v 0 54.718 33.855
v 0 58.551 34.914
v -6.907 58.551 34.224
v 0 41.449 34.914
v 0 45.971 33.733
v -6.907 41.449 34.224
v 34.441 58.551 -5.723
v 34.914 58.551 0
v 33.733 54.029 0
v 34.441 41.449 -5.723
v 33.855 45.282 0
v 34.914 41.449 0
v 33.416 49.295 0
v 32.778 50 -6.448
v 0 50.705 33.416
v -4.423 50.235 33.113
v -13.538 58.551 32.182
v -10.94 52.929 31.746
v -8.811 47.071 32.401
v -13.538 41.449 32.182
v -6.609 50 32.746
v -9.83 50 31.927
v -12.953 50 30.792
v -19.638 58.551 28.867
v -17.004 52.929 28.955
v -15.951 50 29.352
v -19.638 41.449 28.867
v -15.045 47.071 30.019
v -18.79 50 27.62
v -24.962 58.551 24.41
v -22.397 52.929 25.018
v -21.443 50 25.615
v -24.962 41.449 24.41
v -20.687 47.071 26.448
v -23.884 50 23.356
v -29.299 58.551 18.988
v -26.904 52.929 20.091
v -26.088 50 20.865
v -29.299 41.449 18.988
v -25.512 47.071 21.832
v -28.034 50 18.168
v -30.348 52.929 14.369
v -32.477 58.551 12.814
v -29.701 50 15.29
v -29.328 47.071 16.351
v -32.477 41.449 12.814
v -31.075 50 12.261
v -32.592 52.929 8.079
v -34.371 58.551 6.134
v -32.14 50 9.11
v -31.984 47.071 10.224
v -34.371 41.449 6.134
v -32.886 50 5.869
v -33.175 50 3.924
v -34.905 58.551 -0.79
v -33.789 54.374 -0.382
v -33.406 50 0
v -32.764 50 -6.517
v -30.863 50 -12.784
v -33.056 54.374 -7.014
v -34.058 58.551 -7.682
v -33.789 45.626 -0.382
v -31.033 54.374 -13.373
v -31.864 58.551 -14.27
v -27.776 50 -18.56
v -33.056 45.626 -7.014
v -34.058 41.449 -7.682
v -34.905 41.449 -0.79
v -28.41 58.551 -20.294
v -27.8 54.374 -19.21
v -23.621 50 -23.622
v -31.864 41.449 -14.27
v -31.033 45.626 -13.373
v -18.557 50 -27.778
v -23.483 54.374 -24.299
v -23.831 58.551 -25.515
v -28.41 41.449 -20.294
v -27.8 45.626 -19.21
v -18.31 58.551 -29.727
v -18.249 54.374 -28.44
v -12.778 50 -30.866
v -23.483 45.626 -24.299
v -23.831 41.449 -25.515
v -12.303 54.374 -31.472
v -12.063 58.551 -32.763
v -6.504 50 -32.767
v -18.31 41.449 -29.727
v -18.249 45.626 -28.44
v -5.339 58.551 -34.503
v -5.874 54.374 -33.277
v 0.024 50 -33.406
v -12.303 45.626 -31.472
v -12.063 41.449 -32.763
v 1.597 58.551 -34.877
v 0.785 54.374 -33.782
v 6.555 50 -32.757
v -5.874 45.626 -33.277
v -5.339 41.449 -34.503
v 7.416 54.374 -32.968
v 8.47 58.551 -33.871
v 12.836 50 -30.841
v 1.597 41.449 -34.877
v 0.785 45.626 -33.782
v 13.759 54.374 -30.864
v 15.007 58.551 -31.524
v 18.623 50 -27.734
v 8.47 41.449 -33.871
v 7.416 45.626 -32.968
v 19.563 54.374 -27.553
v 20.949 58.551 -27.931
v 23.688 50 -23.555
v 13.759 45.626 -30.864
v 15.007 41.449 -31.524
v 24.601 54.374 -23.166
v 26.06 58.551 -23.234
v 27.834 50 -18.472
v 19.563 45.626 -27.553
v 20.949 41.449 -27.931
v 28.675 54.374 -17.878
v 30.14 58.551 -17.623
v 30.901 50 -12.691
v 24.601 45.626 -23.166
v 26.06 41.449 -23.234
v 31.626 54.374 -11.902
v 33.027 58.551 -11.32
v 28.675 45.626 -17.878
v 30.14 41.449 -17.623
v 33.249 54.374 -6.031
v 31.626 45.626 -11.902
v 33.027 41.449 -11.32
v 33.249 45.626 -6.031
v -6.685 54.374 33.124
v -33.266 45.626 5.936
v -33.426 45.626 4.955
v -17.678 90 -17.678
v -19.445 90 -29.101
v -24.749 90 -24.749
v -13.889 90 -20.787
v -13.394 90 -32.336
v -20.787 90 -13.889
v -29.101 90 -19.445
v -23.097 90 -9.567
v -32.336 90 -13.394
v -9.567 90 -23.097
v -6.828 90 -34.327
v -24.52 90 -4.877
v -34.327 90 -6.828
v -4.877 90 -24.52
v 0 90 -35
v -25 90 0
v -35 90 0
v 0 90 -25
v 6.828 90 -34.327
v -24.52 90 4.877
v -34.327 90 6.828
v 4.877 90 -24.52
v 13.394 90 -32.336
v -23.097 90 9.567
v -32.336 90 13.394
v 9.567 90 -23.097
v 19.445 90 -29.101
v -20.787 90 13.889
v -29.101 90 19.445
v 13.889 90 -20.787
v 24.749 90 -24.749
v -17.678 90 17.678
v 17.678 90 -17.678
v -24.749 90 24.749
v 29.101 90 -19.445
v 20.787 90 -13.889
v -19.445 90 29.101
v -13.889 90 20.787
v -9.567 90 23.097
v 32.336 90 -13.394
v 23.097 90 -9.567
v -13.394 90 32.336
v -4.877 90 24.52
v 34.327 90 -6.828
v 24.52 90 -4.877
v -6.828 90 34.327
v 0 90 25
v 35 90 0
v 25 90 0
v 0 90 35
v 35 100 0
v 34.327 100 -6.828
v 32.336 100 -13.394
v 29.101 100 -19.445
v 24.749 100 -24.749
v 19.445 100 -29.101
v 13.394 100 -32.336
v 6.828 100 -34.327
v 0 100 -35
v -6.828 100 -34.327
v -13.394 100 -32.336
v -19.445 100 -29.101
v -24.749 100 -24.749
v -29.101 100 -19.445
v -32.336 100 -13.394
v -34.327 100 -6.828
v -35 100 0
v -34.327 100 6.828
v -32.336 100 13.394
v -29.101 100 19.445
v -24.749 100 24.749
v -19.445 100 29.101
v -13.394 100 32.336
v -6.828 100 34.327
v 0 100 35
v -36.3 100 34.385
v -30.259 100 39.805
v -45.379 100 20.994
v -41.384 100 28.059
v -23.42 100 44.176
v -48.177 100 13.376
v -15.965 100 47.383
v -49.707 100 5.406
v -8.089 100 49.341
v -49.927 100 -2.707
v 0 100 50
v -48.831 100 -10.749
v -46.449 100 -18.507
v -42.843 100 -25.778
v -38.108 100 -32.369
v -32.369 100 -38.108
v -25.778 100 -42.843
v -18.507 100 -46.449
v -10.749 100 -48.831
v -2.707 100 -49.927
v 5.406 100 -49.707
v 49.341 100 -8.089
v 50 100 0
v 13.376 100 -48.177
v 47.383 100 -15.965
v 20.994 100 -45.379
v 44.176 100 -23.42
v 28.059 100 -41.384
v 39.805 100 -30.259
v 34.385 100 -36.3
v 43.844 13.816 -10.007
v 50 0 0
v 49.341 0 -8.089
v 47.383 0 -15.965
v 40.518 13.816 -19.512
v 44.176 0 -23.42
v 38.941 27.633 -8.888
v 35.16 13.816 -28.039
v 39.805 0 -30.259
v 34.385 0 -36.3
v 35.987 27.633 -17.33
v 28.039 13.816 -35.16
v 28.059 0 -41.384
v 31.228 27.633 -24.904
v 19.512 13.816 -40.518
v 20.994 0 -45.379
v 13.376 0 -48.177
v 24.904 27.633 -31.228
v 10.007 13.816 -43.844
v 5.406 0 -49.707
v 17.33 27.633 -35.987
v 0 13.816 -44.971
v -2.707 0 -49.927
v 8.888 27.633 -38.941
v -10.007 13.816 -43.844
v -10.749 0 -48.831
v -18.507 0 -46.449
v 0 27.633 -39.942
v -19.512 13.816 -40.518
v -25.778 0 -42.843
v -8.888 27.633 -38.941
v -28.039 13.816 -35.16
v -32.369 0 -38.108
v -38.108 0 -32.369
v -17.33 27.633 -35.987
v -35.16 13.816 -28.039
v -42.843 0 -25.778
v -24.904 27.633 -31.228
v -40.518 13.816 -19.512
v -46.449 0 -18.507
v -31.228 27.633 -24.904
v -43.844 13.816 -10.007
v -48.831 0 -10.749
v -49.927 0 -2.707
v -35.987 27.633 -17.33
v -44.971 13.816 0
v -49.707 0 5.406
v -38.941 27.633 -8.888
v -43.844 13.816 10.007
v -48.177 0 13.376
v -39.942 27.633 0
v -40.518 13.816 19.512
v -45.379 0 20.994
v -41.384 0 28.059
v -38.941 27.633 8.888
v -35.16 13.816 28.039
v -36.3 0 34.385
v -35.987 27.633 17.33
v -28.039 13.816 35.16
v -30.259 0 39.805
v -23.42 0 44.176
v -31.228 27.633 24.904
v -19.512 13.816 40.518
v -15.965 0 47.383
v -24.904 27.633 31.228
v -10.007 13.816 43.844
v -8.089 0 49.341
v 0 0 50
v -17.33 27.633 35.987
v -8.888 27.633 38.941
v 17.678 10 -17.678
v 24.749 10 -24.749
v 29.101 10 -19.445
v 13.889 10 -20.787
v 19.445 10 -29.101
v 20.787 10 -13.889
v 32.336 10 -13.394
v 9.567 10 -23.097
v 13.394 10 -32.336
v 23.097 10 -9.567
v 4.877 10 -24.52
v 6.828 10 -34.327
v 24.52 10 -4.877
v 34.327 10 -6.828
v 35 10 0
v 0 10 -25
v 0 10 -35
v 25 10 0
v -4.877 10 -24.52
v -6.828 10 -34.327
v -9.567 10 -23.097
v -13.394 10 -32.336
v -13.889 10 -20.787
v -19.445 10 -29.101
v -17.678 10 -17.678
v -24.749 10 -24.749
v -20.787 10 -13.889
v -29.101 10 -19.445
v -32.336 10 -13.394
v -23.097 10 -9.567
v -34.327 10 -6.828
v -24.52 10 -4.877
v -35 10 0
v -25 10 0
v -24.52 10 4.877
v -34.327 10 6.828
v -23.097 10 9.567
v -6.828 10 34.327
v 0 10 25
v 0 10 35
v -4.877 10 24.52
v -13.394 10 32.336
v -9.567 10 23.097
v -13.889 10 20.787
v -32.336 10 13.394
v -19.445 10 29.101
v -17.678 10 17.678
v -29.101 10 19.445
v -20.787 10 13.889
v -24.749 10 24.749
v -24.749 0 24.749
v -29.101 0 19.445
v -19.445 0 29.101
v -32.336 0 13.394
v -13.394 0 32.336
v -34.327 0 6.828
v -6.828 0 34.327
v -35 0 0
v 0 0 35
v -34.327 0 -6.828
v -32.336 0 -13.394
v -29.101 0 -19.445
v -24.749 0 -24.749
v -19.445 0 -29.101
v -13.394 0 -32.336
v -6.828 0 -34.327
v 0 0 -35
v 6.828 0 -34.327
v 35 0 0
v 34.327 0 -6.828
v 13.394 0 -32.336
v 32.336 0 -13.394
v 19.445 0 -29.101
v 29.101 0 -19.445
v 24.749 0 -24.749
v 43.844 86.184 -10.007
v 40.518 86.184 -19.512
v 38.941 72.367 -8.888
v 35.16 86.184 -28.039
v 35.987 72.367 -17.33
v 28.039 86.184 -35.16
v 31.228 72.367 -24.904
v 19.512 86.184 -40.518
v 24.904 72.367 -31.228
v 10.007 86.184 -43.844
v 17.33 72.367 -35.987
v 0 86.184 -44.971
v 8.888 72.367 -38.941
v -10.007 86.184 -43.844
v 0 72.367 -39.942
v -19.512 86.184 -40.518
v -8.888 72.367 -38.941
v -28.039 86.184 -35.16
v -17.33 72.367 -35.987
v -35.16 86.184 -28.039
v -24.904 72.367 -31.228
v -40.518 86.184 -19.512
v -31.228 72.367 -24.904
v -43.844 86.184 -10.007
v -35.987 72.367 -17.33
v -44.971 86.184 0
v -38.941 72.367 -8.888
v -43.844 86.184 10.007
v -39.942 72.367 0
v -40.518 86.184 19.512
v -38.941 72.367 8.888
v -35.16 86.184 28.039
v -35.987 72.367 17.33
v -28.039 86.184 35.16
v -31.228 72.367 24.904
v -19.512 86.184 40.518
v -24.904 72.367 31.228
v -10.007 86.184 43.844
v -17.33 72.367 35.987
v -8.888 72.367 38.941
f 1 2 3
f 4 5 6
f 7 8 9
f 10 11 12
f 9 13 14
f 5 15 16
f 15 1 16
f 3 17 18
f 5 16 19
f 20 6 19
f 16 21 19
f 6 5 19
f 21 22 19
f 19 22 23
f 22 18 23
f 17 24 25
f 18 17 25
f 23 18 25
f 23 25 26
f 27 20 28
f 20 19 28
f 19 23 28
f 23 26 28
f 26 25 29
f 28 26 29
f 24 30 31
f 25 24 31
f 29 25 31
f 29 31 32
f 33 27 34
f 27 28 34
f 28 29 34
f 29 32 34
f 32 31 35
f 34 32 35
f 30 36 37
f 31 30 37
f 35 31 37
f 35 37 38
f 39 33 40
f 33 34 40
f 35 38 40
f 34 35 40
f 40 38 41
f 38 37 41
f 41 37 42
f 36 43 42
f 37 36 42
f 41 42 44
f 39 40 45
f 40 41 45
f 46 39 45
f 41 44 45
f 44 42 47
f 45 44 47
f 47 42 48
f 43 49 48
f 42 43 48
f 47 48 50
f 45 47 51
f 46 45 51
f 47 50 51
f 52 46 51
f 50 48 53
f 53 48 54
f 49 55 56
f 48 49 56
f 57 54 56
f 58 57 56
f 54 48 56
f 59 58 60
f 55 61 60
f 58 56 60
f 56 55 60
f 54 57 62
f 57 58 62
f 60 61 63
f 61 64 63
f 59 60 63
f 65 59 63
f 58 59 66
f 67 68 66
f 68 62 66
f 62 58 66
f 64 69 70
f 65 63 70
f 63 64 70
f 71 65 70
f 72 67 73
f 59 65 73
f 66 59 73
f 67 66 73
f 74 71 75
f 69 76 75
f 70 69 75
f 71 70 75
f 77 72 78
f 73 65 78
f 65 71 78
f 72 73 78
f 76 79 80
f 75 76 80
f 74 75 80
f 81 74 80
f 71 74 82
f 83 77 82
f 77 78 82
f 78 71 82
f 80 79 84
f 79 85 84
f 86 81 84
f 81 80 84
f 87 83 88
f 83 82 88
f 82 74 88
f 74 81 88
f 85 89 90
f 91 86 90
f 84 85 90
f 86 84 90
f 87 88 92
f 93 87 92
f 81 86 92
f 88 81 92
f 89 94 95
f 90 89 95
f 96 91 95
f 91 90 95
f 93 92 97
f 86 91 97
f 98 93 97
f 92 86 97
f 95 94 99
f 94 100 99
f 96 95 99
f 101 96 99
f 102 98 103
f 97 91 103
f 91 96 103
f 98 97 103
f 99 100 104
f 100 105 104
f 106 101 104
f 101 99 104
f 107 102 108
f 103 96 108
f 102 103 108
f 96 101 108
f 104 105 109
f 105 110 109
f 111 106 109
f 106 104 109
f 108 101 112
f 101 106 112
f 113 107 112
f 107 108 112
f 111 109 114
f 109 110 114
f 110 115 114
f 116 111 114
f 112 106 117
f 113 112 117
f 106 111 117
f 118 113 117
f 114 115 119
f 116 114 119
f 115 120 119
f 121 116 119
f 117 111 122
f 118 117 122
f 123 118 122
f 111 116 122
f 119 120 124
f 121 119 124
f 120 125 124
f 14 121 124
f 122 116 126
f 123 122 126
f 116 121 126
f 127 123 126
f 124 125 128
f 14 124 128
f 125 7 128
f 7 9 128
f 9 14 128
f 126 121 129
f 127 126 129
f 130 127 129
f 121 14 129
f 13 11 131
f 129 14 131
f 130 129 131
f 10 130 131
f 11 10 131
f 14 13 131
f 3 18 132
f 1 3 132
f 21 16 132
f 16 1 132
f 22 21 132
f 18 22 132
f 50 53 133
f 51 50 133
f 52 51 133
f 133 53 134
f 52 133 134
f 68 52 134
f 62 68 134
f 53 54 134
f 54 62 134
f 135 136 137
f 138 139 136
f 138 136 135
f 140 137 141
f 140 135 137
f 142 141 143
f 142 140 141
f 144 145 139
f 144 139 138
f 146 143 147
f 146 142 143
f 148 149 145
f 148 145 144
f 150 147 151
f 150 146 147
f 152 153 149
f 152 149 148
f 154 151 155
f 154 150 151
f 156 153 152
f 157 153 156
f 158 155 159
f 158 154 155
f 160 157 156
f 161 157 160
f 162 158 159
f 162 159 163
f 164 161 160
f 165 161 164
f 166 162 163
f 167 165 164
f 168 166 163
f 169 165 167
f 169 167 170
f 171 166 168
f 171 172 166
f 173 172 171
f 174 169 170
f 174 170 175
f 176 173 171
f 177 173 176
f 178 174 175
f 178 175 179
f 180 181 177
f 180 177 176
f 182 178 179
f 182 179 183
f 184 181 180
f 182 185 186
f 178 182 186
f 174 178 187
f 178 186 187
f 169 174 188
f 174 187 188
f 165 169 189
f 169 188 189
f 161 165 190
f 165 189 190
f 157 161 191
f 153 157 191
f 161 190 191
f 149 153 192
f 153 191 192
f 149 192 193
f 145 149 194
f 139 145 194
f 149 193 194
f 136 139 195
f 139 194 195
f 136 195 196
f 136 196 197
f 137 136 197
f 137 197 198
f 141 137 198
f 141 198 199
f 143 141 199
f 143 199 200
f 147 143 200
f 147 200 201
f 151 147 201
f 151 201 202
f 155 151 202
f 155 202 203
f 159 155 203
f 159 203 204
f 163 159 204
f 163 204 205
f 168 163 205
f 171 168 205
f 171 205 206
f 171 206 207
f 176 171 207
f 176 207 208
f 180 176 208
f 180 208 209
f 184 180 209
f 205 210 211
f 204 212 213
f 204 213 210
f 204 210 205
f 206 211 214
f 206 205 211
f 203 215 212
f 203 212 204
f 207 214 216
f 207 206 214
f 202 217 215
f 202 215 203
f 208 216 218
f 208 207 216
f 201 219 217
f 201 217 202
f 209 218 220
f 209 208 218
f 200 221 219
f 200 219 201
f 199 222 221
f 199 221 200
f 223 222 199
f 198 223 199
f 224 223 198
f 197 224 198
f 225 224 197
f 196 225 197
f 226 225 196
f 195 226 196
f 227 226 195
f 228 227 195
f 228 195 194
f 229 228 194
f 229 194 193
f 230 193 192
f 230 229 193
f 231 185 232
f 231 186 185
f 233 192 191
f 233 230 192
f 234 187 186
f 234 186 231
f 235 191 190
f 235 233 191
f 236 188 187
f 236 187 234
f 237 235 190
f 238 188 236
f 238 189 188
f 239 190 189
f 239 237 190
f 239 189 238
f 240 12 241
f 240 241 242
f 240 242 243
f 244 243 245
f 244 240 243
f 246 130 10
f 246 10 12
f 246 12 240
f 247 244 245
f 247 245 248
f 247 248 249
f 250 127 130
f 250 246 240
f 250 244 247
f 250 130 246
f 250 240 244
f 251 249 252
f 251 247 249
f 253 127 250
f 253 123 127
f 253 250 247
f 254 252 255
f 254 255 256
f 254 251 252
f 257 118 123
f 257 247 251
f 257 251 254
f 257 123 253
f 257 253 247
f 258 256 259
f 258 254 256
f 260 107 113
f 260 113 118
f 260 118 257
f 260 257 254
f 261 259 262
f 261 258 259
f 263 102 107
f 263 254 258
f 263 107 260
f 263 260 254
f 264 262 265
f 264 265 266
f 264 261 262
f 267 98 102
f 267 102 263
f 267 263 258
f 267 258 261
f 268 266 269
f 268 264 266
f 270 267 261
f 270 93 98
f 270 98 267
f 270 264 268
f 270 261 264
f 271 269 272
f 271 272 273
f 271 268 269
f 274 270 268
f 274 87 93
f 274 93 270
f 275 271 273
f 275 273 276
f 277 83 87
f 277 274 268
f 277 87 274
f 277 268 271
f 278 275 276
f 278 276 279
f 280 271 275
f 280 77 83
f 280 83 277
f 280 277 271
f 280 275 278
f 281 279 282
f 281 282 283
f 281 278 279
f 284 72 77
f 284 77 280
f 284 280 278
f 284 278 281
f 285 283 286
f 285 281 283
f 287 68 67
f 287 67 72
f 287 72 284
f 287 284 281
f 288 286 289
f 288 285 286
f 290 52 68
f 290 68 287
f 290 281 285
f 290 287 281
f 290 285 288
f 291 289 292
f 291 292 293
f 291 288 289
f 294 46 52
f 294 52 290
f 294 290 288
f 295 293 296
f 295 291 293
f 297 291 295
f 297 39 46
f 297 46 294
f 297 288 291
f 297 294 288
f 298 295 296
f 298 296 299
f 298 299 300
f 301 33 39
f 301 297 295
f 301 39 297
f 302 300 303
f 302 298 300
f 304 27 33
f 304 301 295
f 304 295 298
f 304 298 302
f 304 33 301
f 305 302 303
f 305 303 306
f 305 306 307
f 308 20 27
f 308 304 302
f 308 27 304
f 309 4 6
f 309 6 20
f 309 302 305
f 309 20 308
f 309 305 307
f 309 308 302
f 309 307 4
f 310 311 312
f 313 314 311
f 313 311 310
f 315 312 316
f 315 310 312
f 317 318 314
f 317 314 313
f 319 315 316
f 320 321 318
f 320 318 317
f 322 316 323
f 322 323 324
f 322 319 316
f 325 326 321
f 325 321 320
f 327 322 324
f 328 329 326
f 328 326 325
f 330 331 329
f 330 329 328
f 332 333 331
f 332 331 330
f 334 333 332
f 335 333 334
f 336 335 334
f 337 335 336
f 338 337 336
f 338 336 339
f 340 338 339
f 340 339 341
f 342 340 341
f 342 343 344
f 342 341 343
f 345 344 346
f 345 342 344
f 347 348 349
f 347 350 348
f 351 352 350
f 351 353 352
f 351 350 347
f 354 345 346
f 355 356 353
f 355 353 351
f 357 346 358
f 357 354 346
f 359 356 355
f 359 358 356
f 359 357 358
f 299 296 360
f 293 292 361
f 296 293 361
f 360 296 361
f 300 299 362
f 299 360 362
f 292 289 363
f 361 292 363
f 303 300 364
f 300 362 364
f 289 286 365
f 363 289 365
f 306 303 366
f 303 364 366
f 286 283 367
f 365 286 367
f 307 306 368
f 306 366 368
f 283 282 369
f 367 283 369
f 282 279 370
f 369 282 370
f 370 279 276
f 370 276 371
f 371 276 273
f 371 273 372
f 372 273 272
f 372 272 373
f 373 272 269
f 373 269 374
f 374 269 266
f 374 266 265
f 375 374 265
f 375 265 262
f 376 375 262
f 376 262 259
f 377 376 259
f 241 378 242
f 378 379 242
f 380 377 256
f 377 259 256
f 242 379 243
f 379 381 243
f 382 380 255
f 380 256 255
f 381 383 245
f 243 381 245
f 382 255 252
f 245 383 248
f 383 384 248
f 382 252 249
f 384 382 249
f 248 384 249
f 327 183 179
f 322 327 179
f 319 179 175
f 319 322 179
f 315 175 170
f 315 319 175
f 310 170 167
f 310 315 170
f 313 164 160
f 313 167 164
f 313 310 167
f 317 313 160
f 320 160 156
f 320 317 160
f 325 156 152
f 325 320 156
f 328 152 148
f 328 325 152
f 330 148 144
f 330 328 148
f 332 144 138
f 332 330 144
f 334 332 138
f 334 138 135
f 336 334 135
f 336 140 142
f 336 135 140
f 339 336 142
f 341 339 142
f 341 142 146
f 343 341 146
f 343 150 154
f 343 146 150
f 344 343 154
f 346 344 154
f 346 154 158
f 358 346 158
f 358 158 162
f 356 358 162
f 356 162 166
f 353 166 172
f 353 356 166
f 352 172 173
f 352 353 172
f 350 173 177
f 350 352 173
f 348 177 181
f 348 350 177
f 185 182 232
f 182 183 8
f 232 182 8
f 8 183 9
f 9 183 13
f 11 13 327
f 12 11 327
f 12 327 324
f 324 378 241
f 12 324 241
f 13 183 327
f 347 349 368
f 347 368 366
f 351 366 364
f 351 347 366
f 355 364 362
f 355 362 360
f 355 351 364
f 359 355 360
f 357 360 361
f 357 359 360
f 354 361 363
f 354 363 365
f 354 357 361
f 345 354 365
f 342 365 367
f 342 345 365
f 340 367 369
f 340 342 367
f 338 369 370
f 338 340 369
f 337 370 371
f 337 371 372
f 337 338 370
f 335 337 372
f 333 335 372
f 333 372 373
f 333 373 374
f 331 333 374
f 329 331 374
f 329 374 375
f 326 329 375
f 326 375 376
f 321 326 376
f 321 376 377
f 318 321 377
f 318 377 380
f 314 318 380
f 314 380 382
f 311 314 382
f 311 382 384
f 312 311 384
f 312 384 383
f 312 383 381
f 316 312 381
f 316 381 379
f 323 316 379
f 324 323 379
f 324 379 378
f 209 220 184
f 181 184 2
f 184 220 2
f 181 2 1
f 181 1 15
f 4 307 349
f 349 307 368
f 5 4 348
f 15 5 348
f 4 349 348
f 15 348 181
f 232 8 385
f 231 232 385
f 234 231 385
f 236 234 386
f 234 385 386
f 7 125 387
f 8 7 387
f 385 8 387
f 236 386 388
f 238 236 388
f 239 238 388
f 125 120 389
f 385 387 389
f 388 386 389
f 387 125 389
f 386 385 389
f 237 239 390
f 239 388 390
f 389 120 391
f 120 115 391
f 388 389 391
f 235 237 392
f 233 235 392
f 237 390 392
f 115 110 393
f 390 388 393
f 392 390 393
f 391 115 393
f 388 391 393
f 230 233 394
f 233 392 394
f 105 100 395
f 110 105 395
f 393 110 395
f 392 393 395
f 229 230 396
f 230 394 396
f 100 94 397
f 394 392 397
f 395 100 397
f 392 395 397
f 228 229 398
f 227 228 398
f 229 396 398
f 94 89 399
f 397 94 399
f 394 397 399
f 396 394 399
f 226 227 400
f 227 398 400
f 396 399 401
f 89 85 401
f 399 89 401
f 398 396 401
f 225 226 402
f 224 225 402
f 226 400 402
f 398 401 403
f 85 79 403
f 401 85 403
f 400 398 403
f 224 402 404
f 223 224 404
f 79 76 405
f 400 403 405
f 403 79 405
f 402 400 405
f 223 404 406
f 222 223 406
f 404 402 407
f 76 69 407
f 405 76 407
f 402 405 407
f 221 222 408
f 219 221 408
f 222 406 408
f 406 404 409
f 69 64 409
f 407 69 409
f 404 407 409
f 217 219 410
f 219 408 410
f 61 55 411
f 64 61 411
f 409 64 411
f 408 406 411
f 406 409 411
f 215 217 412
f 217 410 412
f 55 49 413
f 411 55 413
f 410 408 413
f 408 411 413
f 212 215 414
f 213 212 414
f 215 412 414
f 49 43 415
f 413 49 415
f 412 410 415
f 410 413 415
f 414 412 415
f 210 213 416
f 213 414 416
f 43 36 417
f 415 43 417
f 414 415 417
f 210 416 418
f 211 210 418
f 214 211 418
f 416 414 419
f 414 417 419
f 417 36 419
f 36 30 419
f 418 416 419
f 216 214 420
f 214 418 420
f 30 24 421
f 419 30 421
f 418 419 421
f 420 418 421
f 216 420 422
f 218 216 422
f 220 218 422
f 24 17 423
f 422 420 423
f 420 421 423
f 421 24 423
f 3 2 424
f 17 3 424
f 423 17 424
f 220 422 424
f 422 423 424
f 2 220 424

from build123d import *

# Parameters (mm, degrees)
SKETCH1_R               = 50
BOSS_EXTRUDE1_DEPTH     = 50
BOSS_EXTRUDE1_TAPER     = 20
CUT_EXTRUDE1_DEPTH      = 123.474487302
CUT_EXTRUDE1_DEPTH_BACK = 123.474487302
SKETCH2_R               = 25
SKETCH3_R               = 35
CUT_EXTRUDE2_DEPTH      = 10
CUT_EXTRUDE5_START      = -10
SKETCH5_R               = 35
CUT_EXTRUDE5_DEPTH      = 10
FILLET1_R               = 25
CUT_EXTRUDE6_DEPTH      = 123.474487302
CUT_EXTRUDE6_DEPTH_BACK = 123.474487302


with BuildPart() as part:
    # Sketch1 → Boss-Extrude1 (new body)
    with BuildSketch(Plane(origin=(0, 0, 0), x_dir=(1, 0, 0), z_dir=(0, 1, 0))):
        Circle(SKETCH1_R)
    boss_extrude1 = extrude(amount=BOSS_EXTRUDE1_DEPTH, taper=BOSS_EXTRUDE1_TAPER)

    # Mirror2: Boss-Extrude1 across plane
    add(boss_extrude1.mirror(Plane.ZX.offset(50)))

    # Sketch2 → Cut-Extrude1 (cut, two sides: drawn at the far end of the back side and taken through both)
    with BuildSketch(Plane(origin=(0, 100, 0), x_dir=(1, 0, 0), z_dir=(0, 1, 0)).offset(-CUT_EXTRUDE1_DEPTH_BACK)):
        with Locations(Location((0, 0, 0), (0, 0, 270))):
            Circle(SKETCH2_R)
    extrude(amount=CUT_EXTRUDE1_DEPTH + CUT_EXTRUDE1_DEPTH_BACK, mode=Mode.SUBTRACT)

    # Sketch3 → Cut-Extrude2 (cut)
    with BuildSketch(Plane(origin=(0, 100, 0), x_dir=(1, 0, 0), z_dir=(0, 1, 0))):
        with Locations(Location((0, 0, 0), (0, 0, 270))):
            Circle(SKETCH3_R)
    extrude(amount=-CUT_EXTRUDE2_DEPTH, mode=Mode.SUBTRACT)

    # Sketch5 → Cut-Extrude5 (cut)
    with BuildSketch(Plane.XZ.offset(CUT_EXTRUDE5_START)):
        with Locations(Location((0, 0, 0), (0, 0, 90))):
            Circle(SKETCH5_R)
    extrude(amount=CUT_EXTRUDE5_DEPTH, mode=Mode.SUBTRACT)

    # Fillet1
    fillet1_edges = [part.edges().sort_by_distance(p)[0] for p in [
        (-31.801488287, 50, 0),
    ]]
    fillet(fillet1_edges, radius=FILLET1_R)

    # Sketch7 → Cut-Extrude6 (cut, two sides: drawn at the far end of the back side and taken through both)
    with BuildSketch(Plane(origin=(0, 100, 0), x_dir=(1, 0, 0), z_dir=(0, 1, 0)).offset(-CUT_EXTRUDE6_DEPTH_BACK)):
        with BuildLine():
            Line((0, -50), (0, 0))
            Line((0, 0), (50, 0))
            ThreePointArc((50, 0), (35.355339059, -35.355339059), (0, -50))
        make_face()
    extrude(amount=CUT_EXTRUDE6_DEPTH + CUT_EXTRUDE6_DEPTH_BACK, mode=Mode.SUBTRACT)


solid = part.part
